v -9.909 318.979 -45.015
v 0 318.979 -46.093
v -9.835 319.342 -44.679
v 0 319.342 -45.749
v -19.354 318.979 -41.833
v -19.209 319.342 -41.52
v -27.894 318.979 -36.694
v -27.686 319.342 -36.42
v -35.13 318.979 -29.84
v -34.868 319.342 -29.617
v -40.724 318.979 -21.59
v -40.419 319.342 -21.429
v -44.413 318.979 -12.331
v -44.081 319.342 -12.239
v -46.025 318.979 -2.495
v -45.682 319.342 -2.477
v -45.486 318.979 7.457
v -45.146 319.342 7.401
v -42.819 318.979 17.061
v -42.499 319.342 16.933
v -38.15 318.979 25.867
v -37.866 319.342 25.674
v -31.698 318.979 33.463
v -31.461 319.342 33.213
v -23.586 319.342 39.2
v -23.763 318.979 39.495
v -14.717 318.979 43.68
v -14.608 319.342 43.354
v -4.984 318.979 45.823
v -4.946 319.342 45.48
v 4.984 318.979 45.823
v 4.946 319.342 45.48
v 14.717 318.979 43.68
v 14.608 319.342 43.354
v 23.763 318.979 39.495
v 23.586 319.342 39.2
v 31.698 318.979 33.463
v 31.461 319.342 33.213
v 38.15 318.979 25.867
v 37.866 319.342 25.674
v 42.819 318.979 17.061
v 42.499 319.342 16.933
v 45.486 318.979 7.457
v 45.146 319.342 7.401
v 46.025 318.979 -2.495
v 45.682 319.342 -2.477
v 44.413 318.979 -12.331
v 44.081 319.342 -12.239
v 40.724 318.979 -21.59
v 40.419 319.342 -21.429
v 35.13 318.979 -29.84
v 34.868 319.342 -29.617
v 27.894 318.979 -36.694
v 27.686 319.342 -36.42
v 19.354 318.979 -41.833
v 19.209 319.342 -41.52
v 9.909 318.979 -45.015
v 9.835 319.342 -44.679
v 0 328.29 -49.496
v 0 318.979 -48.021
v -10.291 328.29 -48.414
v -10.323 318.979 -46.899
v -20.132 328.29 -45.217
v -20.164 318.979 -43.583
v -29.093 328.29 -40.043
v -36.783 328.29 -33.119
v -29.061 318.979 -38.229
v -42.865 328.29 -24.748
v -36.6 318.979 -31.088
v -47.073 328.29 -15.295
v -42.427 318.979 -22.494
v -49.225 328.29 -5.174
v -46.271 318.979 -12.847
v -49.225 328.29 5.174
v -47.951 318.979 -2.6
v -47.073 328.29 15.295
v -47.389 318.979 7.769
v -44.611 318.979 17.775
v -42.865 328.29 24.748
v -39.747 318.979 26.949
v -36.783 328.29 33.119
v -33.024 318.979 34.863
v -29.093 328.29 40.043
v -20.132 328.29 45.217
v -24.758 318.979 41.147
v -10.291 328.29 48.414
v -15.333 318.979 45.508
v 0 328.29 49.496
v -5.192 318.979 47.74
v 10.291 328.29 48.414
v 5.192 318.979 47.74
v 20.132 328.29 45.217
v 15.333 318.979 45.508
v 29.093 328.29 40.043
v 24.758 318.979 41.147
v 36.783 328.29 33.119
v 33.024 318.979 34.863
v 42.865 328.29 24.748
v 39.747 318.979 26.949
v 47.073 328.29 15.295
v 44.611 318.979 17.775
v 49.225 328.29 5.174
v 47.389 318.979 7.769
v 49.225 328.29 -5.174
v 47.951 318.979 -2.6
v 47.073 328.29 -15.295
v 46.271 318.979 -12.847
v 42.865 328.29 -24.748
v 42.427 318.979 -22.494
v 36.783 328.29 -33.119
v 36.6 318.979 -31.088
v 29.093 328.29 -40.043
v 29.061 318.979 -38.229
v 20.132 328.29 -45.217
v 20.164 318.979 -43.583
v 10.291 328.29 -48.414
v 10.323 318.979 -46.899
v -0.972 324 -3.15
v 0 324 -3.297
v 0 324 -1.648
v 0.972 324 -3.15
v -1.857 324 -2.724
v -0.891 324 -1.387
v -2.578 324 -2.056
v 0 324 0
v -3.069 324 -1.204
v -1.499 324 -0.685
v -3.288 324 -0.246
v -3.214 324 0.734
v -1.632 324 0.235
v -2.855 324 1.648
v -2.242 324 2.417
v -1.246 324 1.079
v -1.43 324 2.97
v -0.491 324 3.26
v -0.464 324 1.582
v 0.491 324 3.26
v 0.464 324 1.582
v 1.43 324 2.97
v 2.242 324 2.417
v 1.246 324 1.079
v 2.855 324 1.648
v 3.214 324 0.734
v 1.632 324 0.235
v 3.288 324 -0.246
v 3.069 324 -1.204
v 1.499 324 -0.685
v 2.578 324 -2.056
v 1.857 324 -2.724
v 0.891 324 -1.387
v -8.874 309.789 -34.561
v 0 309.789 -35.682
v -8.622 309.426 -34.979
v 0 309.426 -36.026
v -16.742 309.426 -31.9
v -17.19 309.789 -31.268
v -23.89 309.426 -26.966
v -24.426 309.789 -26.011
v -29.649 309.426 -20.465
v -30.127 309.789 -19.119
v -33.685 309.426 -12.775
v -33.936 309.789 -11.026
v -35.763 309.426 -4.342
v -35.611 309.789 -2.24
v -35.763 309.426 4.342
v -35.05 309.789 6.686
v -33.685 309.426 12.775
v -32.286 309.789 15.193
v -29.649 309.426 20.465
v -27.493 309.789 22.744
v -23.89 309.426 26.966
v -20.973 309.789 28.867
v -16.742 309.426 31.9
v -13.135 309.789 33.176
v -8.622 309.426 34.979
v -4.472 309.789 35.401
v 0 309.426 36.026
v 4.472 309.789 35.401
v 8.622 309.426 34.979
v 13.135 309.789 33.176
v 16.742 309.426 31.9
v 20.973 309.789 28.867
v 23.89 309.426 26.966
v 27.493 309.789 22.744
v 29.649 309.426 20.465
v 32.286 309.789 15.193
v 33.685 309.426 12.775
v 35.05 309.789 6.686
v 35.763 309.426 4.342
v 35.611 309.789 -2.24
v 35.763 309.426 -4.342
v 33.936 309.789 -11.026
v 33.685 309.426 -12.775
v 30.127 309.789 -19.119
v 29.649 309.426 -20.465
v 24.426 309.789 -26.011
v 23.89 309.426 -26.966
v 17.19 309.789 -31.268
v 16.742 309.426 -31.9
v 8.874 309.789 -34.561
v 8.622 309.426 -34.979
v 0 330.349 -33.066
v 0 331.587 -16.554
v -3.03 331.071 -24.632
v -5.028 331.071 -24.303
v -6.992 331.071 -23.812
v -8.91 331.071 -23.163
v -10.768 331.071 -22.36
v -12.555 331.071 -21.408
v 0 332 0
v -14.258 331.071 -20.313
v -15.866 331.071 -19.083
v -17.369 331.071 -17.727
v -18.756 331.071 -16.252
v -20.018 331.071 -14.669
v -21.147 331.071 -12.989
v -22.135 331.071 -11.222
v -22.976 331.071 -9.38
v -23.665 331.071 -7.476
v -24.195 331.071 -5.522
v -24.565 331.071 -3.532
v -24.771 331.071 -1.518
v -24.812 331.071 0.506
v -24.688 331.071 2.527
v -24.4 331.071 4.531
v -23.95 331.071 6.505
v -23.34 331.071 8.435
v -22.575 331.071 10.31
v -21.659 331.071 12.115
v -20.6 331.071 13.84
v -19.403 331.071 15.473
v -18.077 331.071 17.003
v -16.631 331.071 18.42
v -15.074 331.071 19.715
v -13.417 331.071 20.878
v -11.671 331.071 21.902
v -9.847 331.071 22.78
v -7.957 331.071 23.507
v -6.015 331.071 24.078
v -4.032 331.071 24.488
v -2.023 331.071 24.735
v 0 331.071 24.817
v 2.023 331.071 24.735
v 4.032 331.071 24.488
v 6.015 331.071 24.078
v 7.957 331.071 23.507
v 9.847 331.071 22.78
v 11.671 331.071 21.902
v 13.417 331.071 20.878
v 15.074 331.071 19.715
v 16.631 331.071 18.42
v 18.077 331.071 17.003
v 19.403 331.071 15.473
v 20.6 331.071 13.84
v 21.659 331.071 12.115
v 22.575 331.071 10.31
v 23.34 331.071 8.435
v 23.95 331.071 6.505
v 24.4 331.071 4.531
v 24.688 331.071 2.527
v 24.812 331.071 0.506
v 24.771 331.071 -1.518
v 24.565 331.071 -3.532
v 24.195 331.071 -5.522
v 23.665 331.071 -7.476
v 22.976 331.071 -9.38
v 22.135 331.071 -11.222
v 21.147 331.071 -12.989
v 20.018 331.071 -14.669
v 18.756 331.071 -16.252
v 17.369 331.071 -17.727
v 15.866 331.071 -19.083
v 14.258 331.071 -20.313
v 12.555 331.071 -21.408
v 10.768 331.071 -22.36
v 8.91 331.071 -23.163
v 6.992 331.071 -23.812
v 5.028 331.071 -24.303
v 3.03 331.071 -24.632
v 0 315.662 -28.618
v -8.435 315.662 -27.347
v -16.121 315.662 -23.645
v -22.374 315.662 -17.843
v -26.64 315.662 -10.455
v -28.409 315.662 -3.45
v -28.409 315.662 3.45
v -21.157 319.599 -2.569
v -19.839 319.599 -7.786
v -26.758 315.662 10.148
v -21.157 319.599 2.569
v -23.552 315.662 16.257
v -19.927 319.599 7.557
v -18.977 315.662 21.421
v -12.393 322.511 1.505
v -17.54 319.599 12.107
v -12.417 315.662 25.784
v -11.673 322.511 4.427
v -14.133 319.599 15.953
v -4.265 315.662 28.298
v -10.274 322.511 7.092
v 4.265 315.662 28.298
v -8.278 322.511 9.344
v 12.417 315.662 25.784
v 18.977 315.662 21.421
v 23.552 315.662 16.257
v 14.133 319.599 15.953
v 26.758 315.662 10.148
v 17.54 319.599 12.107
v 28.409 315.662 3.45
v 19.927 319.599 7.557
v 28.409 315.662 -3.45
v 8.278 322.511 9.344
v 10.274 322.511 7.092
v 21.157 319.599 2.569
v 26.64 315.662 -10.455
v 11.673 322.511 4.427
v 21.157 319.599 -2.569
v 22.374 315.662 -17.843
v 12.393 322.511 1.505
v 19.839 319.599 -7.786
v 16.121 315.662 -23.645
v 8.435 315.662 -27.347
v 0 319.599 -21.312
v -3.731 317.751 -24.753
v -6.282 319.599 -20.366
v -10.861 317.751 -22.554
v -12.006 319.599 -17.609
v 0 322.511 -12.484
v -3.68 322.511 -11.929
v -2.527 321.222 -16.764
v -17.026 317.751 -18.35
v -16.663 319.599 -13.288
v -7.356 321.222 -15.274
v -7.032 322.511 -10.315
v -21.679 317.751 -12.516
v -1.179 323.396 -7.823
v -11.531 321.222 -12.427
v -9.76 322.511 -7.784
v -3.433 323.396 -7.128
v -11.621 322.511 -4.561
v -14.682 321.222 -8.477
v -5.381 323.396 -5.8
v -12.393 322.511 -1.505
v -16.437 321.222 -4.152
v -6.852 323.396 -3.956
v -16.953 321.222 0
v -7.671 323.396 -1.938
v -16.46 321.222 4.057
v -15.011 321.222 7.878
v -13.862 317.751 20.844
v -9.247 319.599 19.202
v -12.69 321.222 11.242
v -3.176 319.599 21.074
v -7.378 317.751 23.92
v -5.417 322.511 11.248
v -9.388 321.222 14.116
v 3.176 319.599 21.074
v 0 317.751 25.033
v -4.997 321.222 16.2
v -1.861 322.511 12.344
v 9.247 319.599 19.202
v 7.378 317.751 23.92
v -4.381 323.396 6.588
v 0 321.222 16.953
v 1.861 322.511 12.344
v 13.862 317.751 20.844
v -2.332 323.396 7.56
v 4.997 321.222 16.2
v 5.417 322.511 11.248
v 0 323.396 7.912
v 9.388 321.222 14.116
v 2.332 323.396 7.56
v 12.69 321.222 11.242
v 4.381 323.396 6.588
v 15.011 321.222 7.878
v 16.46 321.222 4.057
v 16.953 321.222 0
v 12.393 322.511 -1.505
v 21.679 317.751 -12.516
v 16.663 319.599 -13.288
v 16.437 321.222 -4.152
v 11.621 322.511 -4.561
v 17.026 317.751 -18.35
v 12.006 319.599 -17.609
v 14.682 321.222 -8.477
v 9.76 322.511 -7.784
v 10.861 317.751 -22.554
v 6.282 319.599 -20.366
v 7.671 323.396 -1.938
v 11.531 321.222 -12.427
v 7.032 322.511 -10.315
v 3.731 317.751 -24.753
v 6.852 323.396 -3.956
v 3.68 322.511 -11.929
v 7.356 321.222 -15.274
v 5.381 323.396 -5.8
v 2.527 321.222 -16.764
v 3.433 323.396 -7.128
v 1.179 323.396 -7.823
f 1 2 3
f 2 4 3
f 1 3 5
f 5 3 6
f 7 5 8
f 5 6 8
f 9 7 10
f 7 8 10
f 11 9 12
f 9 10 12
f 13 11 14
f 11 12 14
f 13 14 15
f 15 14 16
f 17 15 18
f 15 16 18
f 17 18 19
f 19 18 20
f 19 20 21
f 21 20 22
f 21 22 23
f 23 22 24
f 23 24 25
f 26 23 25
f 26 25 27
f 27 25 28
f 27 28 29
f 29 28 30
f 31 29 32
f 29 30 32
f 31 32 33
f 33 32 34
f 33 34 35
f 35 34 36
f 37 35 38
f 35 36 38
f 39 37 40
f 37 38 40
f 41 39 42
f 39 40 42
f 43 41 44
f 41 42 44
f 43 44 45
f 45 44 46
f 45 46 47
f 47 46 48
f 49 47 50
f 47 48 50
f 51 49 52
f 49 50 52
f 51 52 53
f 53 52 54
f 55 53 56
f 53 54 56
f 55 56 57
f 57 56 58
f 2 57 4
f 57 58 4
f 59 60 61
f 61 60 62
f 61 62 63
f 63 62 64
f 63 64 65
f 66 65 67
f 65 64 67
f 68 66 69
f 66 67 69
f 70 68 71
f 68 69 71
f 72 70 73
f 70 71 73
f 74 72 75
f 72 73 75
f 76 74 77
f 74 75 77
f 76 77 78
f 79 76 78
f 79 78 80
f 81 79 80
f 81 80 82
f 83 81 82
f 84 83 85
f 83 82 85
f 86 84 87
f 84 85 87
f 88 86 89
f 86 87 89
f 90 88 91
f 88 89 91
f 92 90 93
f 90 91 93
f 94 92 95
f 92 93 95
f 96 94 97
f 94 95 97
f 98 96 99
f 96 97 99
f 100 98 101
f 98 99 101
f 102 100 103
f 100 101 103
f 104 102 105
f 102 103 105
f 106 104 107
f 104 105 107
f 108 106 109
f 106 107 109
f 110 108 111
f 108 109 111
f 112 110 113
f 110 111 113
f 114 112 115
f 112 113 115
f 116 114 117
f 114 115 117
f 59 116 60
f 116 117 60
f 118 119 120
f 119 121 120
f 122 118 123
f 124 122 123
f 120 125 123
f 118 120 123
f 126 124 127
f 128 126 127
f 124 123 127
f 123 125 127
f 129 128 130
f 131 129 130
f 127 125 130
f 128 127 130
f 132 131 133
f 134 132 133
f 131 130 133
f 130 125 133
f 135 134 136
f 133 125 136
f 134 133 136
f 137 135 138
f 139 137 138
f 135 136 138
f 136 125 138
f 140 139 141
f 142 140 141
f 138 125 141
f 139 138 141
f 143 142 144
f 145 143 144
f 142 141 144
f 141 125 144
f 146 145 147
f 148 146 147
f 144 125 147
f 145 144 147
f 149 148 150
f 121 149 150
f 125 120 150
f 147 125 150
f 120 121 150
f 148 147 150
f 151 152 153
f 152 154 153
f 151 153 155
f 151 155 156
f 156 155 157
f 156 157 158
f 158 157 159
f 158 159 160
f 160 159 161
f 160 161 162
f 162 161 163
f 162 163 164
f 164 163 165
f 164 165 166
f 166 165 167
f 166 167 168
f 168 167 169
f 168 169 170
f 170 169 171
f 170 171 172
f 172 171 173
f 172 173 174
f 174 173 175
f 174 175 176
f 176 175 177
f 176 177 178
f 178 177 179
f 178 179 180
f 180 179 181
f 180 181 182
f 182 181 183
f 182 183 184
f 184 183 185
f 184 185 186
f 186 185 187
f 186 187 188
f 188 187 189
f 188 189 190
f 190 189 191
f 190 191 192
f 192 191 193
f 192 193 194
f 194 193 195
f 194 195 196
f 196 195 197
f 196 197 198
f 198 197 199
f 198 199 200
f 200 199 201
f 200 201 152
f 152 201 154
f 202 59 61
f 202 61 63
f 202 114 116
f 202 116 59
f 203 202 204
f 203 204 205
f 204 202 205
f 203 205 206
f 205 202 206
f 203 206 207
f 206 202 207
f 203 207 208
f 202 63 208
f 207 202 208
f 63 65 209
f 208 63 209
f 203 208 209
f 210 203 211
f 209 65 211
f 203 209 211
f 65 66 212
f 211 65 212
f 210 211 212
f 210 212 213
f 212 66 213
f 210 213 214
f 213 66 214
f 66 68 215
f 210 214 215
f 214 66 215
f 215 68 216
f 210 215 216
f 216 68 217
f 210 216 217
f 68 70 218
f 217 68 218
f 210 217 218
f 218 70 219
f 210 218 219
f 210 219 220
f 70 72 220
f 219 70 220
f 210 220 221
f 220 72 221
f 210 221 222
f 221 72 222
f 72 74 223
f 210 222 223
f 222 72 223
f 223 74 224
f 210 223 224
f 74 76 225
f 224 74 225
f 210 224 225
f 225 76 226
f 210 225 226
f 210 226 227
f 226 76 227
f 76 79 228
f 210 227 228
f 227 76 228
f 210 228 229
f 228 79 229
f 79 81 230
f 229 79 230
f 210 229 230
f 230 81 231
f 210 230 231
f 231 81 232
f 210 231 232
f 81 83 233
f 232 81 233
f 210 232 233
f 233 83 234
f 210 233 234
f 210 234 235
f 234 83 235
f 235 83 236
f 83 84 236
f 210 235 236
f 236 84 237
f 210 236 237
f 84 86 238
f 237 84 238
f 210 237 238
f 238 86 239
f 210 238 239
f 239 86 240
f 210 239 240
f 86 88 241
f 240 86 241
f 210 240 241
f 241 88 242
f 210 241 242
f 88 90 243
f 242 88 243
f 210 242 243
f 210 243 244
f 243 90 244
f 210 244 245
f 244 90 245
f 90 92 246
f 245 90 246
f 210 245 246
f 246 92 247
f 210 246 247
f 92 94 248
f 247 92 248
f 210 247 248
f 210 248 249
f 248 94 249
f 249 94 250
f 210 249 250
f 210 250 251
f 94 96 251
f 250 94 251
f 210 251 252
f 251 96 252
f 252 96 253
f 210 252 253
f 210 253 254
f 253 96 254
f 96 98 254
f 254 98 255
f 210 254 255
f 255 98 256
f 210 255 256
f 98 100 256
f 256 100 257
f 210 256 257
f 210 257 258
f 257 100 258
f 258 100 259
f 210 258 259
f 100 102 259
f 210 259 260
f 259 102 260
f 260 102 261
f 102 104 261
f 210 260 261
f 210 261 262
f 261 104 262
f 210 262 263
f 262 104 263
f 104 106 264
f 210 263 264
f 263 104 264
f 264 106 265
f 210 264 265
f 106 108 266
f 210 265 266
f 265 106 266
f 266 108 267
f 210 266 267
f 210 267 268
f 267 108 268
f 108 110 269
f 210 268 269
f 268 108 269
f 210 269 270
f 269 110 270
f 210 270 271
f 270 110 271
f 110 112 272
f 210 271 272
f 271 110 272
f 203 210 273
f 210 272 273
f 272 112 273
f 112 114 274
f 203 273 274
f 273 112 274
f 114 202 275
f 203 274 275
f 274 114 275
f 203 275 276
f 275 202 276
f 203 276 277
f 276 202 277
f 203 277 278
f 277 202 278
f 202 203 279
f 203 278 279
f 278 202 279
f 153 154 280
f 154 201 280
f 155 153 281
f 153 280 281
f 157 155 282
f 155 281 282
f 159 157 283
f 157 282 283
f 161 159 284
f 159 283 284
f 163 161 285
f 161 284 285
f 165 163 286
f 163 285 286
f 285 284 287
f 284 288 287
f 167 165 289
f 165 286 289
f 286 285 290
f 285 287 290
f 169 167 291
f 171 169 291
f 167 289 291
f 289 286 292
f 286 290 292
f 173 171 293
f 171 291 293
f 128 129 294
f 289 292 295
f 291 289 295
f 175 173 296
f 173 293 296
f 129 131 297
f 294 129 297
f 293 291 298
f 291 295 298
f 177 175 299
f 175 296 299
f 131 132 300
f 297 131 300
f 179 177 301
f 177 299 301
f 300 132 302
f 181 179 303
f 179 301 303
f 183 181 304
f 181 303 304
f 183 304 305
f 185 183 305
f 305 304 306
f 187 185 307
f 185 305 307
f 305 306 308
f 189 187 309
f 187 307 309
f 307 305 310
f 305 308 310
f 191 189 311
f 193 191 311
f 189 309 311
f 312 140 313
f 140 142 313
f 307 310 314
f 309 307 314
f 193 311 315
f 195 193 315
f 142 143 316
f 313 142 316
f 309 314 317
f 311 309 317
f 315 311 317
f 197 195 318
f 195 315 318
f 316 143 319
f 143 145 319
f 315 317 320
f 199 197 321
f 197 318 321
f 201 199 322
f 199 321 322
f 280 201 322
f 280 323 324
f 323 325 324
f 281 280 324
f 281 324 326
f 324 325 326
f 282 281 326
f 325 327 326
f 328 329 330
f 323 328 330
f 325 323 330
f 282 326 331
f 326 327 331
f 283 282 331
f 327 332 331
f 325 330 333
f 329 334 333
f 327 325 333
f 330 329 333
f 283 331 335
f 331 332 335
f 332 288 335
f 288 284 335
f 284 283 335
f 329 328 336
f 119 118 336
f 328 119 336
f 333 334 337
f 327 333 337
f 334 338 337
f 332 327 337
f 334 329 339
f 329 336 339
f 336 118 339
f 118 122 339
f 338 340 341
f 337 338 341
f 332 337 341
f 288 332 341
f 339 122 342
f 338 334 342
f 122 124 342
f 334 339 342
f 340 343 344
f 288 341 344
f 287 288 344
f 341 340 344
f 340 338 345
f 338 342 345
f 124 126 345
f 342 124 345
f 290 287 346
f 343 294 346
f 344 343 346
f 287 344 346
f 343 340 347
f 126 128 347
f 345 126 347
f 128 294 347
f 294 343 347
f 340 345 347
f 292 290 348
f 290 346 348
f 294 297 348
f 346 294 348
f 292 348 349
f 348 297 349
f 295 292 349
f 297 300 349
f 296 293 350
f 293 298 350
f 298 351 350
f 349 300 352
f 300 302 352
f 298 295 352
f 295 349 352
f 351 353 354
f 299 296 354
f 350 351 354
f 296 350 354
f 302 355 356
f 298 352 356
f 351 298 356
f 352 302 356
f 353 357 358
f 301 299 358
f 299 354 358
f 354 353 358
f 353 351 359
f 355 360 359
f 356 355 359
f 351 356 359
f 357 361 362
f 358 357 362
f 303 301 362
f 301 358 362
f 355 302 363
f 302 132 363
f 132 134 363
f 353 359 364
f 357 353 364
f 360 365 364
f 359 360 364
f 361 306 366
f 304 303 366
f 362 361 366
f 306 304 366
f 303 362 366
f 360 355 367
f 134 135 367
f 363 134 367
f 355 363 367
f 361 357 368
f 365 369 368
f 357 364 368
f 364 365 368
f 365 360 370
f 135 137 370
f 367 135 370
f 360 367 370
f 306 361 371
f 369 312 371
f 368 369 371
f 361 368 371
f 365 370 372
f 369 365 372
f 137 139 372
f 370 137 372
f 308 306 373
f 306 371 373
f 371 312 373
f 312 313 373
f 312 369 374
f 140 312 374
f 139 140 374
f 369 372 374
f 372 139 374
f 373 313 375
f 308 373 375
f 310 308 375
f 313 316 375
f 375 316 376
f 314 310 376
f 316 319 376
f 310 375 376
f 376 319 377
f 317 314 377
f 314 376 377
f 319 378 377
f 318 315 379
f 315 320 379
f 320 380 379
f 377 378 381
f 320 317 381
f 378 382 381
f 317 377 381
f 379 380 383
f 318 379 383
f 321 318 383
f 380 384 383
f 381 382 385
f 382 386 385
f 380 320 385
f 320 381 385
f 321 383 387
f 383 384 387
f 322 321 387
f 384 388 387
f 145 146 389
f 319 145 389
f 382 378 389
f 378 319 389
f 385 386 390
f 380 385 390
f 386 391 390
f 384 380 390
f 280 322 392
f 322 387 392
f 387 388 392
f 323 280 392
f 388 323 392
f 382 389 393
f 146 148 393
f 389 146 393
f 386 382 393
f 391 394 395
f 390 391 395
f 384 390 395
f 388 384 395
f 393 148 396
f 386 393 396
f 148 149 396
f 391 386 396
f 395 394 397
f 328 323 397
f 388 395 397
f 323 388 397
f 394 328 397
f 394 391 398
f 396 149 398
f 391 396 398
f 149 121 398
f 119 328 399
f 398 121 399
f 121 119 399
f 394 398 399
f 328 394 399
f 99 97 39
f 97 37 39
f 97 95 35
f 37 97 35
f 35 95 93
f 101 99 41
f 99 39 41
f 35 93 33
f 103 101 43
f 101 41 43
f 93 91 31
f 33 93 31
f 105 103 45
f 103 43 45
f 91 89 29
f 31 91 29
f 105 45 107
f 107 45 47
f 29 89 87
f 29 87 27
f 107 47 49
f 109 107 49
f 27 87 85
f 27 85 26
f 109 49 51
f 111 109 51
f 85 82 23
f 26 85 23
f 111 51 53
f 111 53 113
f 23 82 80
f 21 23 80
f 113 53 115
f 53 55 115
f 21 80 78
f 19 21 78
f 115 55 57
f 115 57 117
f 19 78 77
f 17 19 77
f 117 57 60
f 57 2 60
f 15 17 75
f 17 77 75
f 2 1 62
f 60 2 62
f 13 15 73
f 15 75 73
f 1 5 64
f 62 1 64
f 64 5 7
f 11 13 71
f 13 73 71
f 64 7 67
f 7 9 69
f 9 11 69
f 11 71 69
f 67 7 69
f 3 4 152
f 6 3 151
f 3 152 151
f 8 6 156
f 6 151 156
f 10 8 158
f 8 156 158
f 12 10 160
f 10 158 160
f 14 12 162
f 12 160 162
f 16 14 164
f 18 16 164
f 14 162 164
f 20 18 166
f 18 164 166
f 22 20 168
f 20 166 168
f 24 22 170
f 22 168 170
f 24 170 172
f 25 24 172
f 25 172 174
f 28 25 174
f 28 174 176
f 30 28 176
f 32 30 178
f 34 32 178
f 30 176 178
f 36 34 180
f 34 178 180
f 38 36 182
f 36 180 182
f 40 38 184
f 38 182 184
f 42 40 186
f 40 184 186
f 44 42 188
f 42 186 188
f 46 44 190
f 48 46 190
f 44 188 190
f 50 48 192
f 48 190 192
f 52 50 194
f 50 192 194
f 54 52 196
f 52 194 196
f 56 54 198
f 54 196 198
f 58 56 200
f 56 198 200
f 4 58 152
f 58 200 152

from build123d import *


with BuildPart() as part:
    # gel → Revolve10 (revolve)
    with BuildSketch(Plane(origin=(0, 0, 0), x_dir=(0, 0, -1), z_dir=(1, 0, 0))):
        with BuildLine():
            Line((45.748610472, 319.342063422), (35.681896581, 309.789108636))
            Line((35.681896581, 309.789108636), (36.026073869, 309.426421451))
            add(Edge.make_bspline(
                [(36.026073869, 309.426421451), (35.418599599, 309.864813343), (34.662663334, 310.791334864), (33.338846471, 311.851350637), (32.195604525, 312.857808267), (31.057999633, 313.930026132), (29.744727596, 314.885066904), (28.443843287, 315.773694322), (27.120617871, 316.745495513), (25.67624262, 317.351925715), (24.437086975, 318.116301123), (23.215591182, 318.685644379), (22.140954977, 319.262698861), (21.068588892, 319.694847458), (19.930975074, 320.193493634), (18.837916971, 320.641634287), (17.733867065, 321.01494492), (16.810008216, 321.249118962), (15.911496119, 321.566233217), (14.864343001, 321.911666773), (13.637151846, 322.313021034), (12.181632664, 322.557718535), (10.750690756, 322.85377071), (9.272215479, 323.156322342), (7.693496909, 323.429691693), (5.699030772, 323.815957427), (4.197169533, 323.839631011), (3.296807109, 324.000001326)],
                knots=[0, 0, 0, 0, 0.060955497, 0.097023752, 0.138612849, 0.185723979, 0.224847013, 0.271346916, 0.31492086, 0.358660312, 0.398942406, 0.433935796, 0.468925884, 0.498724619, 0.528515026, 0.570655164, 0.595402325, 0.623879931, 0.648625043, 0.673368363, 0.714214895, 0.754112569, 0.794010196, 0.833908612, 0.877650512, 0.925245481, 1, 1, 1, 1], degree=3))
            Line((3.296807109, 324.000001326), (0, 324))
            Line((0, 324), (0, 332))
            ThreePointArc((0, 332), (24.81742663, 331.071133347), (49.495985309, 328.289730936))
            Line((49.495985309, 328.289730936), (48.021369991, 318.979376237))
            Line((48.021369991, 318.979376237), (46.09278776, 318.979376237))
            Line((46.09278776, 318.979376237), (45.748610472, 319.342063422))
        make_face()
    revolve(axis=Axis((0, 0, 0), (0, 1, 0)))


solid = part.part
